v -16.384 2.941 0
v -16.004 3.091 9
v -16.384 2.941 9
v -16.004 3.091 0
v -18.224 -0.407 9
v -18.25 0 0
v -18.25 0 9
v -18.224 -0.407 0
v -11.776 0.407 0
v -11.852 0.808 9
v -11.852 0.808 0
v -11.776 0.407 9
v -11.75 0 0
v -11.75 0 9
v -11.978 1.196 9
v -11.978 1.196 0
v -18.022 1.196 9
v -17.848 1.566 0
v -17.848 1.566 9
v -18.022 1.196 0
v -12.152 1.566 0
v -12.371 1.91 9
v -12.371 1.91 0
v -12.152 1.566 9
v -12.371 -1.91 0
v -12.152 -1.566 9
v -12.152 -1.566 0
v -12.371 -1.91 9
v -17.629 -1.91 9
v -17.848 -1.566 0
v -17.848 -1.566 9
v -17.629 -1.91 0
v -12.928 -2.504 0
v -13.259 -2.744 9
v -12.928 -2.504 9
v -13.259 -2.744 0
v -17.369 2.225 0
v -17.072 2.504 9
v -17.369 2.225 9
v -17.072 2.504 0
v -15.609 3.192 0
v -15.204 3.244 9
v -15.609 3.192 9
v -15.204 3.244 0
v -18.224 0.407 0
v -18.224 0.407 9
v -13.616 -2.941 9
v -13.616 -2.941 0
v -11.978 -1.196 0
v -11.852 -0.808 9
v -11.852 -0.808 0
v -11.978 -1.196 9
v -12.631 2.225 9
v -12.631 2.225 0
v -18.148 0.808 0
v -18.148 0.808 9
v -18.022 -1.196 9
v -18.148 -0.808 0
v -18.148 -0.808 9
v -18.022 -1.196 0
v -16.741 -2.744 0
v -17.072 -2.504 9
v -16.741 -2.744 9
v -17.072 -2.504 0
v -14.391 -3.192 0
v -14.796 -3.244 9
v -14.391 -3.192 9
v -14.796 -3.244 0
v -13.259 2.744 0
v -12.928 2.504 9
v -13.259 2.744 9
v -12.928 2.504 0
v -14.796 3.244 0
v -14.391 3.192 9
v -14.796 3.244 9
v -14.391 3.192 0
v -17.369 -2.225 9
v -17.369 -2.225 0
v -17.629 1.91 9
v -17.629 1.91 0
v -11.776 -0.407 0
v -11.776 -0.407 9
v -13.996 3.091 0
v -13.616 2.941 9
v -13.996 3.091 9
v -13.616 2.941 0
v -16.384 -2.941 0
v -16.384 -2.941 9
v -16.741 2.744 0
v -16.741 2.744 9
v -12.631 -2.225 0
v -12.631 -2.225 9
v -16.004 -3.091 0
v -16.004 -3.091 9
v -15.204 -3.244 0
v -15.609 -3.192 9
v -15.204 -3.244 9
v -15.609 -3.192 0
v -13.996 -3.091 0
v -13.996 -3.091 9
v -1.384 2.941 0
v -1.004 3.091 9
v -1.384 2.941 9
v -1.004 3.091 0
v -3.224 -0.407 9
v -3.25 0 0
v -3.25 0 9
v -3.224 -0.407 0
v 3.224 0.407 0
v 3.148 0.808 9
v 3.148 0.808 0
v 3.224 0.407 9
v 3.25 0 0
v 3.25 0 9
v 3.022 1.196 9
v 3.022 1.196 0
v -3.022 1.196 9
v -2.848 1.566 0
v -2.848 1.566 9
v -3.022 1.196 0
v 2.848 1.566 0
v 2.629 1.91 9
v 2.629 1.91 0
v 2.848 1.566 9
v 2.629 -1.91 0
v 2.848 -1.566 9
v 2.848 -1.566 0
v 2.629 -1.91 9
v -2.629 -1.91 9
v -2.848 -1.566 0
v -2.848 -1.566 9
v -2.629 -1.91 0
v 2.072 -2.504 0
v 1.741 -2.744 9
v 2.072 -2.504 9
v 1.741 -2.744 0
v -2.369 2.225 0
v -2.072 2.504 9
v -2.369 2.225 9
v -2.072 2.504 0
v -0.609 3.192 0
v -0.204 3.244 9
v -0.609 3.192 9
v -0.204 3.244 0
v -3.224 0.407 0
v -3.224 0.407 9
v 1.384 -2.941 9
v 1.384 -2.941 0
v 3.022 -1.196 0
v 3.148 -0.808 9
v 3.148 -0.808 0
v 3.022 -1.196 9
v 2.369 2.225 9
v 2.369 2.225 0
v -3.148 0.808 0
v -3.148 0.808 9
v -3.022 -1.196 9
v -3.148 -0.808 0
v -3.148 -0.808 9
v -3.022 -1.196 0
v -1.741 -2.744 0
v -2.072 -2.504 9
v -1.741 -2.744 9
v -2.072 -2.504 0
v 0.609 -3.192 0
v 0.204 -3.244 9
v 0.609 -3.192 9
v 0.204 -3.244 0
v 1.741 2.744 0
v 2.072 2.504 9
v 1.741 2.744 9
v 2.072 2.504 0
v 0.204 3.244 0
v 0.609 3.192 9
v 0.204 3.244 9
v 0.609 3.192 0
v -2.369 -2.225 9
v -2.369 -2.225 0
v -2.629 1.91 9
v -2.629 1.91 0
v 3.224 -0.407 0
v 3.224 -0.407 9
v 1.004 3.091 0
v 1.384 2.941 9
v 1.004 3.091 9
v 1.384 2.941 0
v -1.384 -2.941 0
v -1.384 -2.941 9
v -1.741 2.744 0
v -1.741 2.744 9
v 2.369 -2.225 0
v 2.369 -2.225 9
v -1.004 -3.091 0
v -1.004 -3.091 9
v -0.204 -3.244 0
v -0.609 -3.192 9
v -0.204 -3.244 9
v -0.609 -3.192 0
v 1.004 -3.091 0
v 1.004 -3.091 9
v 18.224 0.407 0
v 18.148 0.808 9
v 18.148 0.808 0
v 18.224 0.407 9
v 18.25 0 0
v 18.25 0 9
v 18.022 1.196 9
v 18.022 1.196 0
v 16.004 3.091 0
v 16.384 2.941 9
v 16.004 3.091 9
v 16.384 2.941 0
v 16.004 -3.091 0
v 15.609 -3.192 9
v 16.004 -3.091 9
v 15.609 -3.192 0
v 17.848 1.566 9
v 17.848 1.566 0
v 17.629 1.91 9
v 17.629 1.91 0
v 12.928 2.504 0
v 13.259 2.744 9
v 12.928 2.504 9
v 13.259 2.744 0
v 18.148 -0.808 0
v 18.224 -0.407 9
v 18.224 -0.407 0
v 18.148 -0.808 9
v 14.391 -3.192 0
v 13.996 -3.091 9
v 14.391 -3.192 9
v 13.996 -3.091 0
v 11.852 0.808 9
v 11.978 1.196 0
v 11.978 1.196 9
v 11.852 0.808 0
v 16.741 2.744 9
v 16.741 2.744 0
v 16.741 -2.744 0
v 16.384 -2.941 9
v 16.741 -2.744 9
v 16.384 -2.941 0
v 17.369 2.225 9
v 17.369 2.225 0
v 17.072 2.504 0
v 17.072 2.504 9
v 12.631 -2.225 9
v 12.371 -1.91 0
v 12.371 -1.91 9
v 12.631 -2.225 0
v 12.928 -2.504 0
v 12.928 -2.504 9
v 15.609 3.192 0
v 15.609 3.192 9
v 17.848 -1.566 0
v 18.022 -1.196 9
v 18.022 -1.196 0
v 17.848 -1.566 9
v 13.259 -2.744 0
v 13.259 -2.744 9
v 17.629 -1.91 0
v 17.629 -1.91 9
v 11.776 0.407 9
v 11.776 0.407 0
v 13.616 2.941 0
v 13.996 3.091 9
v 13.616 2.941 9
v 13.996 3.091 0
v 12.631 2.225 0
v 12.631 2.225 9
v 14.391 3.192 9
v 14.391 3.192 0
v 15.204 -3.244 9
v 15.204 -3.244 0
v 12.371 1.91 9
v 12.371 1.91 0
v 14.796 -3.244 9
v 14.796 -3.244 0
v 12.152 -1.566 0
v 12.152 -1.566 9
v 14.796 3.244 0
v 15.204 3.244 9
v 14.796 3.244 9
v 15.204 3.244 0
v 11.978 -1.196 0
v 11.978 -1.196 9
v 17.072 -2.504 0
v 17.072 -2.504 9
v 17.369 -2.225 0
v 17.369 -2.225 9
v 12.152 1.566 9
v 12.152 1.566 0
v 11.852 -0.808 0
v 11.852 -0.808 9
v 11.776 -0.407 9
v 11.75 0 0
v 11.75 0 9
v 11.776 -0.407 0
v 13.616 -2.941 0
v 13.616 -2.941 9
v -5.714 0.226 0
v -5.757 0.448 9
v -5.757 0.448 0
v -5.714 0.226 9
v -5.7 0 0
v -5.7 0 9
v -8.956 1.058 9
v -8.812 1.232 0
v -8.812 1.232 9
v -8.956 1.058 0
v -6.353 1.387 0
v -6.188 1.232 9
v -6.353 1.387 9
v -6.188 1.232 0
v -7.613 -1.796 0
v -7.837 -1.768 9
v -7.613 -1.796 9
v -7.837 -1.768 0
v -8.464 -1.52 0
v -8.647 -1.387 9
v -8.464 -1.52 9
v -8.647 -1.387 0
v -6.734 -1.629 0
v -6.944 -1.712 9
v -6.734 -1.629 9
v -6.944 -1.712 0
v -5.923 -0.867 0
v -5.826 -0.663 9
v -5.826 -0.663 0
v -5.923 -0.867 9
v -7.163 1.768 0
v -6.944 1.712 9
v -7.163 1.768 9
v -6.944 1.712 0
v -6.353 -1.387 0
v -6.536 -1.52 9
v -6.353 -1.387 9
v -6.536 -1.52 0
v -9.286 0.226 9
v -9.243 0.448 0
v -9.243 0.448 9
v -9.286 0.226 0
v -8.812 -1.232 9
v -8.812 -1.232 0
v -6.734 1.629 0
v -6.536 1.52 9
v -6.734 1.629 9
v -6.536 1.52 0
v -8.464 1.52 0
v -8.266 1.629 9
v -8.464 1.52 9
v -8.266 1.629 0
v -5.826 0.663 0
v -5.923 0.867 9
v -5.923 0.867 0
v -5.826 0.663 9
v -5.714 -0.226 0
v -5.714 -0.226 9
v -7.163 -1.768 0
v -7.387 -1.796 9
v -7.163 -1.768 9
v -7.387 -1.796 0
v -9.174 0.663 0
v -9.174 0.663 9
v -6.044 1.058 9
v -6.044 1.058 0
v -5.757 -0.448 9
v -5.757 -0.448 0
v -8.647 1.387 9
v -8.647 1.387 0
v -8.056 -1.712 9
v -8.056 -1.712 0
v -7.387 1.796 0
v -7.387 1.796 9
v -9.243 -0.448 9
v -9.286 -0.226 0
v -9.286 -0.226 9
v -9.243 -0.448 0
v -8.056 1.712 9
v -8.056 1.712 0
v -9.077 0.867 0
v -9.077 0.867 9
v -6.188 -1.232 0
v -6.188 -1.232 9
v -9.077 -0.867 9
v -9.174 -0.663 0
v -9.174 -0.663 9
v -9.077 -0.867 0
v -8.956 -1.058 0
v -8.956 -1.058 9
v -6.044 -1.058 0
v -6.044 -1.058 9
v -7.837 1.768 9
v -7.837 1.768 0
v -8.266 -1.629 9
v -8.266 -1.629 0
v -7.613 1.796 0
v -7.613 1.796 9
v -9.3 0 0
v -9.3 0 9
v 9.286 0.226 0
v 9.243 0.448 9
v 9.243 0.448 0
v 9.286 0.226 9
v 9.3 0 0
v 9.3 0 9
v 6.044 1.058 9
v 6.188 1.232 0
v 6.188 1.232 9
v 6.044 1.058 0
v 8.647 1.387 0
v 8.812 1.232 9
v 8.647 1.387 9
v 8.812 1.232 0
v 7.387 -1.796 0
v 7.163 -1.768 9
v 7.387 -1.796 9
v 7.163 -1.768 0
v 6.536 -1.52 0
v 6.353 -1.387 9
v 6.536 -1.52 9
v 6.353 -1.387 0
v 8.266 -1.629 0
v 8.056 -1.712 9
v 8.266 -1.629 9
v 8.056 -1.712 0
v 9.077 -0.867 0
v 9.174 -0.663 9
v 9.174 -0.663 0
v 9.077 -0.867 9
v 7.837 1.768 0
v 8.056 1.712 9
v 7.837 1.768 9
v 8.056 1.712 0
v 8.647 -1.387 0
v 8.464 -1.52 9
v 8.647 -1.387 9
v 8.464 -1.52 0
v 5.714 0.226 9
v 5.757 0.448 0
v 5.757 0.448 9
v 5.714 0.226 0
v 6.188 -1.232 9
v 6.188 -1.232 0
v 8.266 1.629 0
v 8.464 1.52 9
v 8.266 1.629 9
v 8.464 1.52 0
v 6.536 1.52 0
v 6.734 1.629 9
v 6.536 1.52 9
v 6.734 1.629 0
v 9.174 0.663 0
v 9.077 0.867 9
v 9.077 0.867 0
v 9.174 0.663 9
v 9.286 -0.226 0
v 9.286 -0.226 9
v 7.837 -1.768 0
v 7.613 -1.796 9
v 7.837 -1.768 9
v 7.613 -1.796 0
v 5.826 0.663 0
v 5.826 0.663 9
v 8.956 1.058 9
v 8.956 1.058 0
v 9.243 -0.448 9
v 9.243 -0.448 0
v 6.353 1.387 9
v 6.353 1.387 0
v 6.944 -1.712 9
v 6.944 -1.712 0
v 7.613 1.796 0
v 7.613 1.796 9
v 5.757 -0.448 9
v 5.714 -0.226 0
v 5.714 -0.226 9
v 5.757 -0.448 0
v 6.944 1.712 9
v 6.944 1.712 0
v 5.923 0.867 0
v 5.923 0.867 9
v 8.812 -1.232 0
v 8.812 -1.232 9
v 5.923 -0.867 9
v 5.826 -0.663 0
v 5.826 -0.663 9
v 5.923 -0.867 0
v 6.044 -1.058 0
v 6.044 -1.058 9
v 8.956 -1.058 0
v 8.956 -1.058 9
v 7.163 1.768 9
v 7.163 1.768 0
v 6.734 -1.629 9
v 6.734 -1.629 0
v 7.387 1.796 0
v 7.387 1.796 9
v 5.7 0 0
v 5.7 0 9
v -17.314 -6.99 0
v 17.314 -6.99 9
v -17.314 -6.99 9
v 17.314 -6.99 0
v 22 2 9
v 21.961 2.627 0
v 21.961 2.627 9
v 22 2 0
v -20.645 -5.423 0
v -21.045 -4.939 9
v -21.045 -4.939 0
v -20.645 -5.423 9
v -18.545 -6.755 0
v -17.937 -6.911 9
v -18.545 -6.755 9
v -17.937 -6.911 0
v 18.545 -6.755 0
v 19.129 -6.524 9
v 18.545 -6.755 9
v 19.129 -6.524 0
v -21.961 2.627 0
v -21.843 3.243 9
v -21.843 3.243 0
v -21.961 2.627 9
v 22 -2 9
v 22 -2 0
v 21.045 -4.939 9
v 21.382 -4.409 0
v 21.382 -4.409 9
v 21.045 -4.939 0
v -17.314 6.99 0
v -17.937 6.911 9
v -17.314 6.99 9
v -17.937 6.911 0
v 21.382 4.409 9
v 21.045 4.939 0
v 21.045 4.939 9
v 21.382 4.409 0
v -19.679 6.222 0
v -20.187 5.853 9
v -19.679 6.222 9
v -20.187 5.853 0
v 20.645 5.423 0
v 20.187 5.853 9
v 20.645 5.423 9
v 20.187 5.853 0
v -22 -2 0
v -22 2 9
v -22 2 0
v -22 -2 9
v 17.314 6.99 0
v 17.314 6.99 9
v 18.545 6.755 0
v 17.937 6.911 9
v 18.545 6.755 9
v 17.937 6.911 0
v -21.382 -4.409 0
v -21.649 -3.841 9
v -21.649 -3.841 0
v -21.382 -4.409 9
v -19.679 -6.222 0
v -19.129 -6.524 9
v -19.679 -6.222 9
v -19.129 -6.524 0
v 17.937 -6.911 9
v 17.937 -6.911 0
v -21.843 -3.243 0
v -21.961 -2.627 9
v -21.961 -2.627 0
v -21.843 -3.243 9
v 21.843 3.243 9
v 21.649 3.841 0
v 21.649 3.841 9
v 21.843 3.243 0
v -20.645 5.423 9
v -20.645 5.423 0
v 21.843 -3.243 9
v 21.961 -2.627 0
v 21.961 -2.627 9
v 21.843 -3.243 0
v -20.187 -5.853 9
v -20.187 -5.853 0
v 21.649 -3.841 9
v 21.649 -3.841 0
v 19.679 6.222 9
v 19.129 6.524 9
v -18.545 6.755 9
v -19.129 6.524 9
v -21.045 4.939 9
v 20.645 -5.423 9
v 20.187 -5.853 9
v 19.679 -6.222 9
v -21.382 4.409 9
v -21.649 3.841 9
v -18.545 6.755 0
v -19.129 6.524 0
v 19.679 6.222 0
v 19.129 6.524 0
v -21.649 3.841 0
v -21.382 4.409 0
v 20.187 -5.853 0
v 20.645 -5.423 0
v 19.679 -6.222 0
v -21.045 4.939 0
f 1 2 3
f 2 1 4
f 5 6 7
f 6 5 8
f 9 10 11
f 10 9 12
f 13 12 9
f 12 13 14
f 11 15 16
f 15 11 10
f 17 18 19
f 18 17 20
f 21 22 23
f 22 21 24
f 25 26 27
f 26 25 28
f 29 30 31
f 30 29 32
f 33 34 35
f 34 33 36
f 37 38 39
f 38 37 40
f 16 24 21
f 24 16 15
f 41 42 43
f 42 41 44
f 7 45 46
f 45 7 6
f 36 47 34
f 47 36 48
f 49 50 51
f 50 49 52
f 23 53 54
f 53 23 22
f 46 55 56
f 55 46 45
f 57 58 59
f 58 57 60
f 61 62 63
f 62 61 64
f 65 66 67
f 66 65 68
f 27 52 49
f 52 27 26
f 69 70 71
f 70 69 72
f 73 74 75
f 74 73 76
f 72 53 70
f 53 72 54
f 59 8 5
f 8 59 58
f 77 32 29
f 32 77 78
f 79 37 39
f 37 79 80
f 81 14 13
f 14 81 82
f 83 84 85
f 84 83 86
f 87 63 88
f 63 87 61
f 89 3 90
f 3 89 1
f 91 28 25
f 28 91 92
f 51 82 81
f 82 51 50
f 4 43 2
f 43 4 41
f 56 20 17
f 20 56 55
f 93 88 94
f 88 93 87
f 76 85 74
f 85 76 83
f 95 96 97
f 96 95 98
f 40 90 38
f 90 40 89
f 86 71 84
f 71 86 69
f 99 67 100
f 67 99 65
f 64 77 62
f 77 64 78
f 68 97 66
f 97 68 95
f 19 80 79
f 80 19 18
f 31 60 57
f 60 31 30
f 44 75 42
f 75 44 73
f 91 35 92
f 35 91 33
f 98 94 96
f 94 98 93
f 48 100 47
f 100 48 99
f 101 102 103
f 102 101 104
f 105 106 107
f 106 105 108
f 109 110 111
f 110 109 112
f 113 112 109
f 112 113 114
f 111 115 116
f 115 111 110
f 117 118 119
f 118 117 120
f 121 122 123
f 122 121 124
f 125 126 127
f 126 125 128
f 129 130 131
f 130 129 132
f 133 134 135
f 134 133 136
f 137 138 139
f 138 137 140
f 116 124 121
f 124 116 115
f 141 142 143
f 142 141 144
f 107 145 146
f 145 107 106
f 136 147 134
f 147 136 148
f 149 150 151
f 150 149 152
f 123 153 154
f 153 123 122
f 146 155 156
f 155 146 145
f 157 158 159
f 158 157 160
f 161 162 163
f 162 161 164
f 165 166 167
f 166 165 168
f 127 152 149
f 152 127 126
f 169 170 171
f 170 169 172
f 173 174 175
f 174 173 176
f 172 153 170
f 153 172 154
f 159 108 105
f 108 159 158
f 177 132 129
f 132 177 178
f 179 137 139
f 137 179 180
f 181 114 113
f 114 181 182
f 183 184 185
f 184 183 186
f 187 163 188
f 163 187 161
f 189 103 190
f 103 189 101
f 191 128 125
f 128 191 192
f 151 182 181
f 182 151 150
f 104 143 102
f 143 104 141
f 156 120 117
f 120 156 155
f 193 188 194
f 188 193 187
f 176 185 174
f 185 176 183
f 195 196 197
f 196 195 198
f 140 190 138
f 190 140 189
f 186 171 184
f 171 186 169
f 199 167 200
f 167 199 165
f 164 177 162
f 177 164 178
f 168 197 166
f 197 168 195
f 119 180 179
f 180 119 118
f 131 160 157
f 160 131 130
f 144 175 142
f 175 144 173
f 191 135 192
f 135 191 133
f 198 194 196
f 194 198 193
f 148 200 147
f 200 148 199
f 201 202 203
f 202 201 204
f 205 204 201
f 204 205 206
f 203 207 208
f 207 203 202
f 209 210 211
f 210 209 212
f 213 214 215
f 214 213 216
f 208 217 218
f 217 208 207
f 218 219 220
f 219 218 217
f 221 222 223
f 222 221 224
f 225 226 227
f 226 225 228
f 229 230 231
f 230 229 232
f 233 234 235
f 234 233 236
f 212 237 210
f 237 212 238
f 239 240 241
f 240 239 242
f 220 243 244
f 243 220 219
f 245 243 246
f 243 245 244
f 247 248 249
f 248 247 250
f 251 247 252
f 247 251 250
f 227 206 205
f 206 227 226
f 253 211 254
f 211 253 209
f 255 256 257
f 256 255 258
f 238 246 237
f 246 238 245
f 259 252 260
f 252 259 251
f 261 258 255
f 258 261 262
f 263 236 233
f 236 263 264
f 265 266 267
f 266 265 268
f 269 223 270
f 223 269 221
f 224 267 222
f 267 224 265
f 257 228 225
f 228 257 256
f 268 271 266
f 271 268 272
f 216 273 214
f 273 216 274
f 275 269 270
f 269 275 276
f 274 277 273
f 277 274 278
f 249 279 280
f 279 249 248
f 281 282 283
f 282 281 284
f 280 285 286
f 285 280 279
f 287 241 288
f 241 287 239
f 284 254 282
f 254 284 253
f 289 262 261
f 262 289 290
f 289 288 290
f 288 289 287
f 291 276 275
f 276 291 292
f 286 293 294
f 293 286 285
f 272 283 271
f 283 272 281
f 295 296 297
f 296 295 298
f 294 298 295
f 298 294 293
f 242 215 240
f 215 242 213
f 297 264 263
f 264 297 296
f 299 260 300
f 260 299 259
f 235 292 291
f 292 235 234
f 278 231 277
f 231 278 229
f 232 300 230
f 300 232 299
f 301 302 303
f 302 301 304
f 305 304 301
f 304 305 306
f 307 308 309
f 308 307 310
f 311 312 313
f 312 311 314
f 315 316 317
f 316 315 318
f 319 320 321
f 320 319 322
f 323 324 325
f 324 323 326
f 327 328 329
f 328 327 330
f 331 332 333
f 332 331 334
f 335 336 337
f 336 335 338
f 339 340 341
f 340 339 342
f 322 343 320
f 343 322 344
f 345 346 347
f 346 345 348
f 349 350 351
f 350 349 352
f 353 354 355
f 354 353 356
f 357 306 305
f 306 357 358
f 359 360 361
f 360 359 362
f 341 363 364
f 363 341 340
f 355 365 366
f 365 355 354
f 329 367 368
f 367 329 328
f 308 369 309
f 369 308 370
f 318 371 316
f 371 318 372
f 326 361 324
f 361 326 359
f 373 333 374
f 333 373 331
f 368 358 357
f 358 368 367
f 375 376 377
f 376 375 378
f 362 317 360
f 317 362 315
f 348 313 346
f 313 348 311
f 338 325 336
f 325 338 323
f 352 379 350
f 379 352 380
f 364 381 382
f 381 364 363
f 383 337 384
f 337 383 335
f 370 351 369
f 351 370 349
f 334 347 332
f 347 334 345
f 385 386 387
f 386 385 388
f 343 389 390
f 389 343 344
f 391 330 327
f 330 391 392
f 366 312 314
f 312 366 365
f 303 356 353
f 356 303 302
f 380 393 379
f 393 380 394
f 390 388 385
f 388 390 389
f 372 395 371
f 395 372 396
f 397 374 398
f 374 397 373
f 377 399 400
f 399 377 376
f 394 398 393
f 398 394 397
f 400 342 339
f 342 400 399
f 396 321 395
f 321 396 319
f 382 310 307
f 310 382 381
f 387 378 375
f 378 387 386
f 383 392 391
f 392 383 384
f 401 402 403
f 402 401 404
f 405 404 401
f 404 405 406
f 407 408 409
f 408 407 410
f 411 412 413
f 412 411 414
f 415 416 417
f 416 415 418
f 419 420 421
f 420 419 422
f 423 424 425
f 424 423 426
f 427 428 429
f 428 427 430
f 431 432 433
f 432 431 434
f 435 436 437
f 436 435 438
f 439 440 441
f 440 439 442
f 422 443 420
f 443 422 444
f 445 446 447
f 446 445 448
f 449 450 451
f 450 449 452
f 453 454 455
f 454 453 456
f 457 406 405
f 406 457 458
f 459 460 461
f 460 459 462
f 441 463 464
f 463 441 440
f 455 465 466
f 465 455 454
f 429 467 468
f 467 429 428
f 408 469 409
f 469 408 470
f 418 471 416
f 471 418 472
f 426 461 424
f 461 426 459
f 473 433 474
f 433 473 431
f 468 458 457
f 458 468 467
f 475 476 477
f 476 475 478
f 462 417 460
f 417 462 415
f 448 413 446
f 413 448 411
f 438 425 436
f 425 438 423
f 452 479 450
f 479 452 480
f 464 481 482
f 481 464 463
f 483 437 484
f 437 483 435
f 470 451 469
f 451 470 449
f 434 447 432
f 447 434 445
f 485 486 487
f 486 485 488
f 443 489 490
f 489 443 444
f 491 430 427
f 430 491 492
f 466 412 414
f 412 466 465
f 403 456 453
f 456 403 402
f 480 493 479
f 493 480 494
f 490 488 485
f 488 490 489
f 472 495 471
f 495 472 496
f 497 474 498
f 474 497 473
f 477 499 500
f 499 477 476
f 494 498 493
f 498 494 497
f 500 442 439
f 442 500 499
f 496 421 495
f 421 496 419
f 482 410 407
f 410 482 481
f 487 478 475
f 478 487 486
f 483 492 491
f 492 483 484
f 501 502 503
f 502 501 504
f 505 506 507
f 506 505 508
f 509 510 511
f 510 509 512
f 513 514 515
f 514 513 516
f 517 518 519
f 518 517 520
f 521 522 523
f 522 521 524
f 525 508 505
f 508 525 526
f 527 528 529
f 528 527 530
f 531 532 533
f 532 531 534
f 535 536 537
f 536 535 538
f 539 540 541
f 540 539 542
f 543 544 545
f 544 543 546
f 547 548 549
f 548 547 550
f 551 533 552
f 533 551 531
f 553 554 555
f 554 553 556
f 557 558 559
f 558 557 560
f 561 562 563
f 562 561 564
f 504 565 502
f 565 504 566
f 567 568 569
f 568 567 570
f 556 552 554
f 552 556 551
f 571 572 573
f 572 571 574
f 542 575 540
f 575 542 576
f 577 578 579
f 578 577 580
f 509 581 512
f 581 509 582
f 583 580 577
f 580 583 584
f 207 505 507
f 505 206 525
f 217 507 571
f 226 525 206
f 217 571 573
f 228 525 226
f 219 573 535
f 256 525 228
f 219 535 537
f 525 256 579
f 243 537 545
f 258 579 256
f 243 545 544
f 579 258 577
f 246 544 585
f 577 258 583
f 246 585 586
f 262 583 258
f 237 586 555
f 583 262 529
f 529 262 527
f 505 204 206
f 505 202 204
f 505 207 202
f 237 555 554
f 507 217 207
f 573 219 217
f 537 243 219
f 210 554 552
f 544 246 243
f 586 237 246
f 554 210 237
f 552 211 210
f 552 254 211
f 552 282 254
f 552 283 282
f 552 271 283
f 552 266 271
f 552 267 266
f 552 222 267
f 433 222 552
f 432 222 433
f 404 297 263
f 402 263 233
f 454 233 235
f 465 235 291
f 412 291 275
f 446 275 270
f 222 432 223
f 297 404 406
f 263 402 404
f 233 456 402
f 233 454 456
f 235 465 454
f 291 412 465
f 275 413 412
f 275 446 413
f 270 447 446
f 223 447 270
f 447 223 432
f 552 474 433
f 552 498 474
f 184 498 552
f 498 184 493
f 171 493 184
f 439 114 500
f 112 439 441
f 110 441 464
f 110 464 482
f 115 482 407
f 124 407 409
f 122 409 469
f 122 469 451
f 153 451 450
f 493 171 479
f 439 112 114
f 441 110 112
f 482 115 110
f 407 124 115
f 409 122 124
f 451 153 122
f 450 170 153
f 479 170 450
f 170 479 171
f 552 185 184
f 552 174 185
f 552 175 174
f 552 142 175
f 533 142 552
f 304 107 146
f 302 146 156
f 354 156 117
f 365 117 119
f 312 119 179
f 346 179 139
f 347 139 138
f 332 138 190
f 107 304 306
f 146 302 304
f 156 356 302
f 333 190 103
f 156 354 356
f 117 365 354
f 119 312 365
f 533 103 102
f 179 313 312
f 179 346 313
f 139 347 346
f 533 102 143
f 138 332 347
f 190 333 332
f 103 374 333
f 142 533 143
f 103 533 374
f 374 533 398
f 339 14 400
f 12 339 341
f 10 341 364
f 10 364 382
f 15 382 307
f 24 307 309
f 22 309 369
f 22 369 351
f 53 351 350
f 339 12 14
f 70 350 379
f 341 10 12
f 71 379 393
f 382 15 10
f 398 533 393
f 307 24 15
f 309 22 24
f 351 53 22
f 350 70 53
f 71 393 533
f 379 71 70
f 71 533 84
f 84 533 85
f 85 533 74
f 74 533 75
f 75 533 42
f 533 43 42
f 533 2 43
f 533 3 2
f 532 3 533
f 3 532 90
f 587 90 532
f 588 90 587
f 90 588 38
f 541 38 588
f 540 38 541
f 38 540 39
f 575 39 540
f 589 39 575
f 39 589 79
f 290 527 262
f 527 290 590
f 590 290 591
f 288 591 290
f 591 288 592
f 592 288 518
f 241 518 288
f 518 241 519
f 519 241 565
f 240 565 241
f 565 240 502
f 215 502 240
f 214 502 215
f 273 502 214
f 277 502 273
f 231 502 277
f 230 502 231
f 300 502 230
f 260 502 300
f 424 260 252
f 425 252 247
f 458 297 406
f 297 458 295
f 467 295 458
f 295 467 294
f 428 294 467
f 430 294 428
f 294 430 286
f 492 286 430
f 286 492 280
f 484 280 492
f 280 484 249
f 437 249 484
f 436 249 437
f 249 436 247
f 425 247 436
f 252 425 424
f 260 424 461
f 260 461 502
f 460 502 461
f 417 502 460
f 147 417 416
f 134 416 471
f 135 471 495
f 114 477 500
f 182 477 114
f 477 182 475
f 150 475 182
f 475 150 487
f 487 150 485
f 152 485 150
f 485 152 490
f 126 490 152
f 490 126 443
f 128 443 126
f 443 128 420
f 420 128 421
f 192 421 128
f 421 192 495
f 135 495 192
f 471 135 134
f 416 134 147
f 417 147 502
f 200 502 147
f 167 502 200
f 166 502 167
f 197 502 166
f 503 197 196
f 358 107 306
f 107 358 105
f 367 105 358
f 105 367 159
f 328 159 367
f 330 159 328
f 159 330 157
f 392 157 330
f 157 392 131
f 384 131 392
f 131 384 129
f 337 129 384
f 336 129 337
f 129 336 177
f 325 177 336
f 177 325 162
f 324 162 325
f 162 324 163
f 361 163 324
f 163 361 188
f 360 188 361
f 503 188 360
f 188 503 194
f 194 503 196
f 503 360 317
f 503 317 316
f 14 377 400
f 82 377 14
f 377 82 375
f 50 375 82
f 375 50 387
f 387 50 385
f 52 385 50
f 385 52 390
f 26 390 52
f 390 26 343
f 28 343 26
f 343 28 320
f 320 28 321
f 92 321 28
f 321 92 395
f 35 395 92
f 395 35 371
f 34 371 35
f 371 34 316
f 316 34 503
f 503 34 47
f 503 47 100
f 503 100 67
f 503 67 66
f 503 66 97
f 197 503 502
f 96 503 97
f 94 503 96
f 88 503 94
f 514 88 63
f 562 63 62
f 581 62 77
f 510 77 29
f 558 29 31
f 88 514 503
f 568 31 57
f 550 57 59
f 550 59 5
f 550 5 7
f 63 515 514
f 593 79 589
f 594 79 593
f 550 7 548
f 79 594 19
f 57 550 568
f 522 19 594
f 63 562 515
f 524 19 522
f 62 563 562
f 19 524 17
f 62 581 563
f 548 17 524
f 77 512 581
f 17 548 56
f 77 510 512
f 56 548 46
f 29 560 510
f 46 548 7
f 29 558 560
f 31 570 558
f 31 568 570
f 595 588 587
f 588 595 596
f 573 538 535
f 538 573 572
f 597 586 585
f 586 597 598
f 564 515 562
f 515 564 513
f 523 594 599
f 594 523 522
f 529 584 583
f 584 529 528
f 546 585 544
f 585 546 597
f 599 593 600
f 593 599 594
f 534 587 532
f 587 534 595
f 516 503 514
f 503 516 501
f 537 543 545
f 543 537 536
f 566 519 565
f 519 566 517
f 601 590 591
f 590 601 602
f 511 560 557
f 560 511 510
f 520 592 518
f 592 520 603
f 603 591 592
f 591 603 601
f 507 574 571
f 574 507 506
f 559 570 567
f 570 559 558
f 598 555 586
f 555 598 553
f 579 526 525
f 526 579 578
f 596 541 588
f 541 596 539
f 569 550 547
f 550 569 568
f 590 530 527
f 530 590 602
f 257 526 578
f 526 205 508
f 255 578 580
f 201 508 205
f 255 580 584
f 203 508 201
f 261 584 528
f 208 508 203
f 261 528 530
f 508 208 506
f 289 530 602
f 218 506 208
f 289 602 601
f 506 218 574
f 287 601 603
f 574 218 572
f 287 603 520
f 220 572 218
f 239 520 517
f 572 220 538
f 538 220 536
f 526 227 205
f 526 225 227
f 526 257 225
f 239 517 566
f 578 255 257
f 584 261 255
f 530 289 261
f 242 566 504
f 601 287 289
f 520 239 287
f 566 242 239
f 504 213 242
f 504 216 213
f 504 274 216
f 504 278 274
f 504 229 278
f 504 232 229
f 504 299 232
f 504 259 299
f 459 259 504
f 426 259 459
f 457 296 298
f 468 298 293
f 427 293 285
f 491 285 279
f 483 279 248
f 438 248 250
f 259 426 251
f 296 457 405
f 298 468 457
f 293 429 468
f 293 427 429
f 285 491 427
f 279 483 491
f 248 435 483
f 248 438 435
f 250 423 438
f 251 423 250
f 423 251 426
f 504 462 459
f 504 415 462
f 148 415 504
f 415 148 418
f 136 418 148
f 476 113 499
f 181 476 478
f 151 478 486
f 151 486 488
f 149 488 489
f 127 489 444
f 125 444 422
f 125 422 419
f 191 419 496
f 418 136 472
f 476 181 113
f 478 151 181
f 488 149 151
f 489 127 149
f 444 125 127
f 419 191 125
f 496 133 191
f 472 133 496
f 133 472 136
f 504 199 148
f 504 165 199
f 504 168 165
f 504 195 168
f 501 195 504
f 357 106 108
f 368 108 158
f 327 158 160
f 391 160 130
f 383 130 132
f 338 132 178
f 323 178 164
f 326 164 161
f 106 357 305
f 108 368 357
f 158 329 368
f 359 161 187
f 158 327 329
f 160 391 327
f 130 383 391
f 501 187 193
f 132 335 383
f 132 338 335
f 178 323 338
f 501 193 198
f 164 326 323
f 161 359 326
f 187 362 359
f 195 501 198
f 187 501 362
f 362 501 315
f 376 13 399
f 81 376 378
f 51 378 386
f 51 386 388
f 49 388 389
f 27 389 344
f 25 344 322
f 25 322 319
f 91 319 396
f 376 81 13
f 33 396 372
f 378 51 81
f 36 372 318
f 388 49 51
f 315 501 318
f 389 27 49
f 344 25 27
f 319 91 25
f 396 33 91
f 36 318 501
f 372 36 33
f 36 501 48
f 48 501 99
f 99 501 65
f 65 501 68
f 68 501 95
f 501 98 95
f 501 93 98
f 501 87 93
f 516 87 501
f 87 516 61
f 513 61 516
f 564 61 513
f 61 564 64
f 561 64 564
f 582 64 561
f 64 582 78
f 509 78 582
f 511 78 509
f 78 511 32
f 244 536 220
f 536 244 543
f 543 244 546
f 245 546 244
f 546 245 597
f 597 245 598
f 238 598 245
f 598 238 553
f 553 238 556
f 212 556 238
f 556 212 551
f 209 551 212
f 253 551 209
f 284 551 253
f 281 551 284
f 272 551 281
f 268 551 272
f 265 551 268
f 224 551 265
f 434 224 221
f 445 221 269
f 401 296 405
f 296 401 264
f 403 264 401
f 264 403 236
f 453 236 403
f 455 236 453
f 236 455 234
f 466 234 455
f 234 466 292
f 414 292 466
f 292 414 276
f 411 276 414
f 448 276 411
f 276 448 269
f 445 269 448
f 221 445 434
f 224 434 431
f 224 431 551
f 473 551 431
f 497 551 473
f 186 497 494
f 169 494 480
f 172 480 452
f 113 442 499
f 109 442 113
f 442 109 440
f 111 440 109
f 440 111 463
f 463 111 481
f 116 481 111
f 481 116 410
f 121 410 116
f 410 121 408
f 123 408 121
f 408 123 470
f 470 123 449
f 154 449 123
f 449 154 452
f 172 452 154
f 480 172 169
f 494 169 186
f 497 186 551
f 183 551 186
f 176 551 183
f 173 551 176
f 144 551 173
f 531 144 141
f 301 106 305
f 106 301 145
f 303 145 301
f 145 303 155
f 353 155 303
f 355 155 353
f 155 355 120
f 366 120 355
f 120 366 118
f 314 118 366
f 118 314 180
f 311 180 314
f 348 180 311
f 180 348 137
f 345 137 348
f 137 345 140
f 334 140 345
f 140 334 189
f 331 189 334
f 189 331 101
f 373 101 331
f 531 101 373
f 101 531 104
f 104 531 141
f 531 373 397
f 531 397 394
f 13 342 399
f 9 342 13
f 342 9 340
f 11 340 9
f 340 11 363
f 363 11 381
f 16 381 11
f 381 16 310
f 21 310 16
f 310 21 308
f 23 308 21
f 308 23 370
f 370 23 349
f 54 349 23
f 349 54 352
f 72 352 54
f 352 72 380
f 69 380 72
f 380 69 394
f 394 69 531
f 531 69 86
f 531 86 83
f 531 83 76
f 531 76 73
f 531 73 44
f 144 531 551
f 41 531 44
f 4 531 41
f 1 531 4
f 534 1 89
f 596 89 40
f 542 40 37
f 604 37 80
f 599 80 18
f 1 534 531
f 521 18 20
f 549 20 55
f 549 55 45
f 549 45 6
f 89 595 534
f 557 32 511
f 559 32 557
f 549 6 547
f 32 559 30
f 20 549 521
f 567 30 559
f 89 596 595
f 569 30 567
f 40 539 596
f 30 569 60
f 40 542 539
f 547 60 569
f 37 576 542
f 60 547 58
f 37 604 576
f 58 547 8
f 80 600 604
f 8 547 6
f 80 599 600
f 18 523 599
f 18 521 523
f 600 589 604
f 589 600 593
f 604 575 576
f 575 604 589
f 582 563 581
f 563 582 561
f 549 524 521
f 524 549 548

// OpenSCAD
$fn = 50;


difference() {
	union() {
		*color(alpha = 1.0000000000, c = "gray") {
			translate(v = [0, 7, 0]) {
				linear_extrude(height = 1) {
					text(font = "Arial:style=Bold", halign = "center", size = 4.5000000000, text = "COMMENT plate main", valign = "center");
				}
			}
		}
		*color(alpha = 1.0000000000, c = "gray") {
			translate(v = [0, 14, 0]) {
				linear_extrude(height = 1) {
					text(font = "Arial:style=Bold", halign = "center", size = 4.5000000000, text = "COMMENT description oobb_plate_shape_p_type_9_depth_3_width_1_height_9_thickness_true_both_holes", valign = "center");
				}
			}
		}
		hull() {
			translate(v = [-17.0000000000, 2.0000000000, 0]) {
				cylinder(h = 9, r = 5);
			}
			translate(v = [17.0000000000, 2.0000000000, 0]) {
				cylinder(h = 9, r = 5);
			}
			translate(v = [-17.0000000000, -2.0000000000, 0]) {
				cylinder(h = 9, r = 5);
			}
			translate(v = [17.0000000000, -2.0000000000, 0]) {
				cylinder(h = 9, r = 5);
			}
		}
	}
	union() {
		*color(alpha = 1.0000000000, c = "gray") {
			translate(v = [0, 7, 0]) {
				linear_extrude(height = 1) {
					text(font = "Arial:style=Bold", halign = "center", size = 4.5000000000, text = "COMMENT holes main", valign = "center");
				}
			}
		}
		*color(alpha = 1.0000000000, c = "gray") {
			translate(v = [0, 14, 0]) {
				linear_extrude(height = 1) {
					text(font = "Arial:style=Bold", halign = "center", size = 4.5000000000, text = "COMMENT description oobb_holes_shape_n_type_3_width_1_height_9_thickness_true_both_holes", valign = "center");
				}
			}
		}
		translate(v = [-15.0000000000, 0.0000000000, 0]) {
			translate(v = [0, 0, -50]) {
				cylinder(h = 100, r = 3.2500000000);
			}
		}
		translate(v = [0, 0, -50]) {
			cylinder(h = 100, r = 3.2500000000);
		}
		translate(v = [15.0000000000, 0.0000000000, 0]) {
			translate(v = [0, 0, -50]) {
				cylinder(h = 100, r = 3.2500000000);
			}
		}
		translate(v = [-15.0000000000, 0.0000000000, 0]) {
			translate(v = [0, 0, -50]) {
				cylinder(h = 100, r = 1.8000000000);
			}
		}
		translate(v = [-7.5000000000, 0.0000000000, 0]) {
			translate(v = [0, 0, -50]) {
				cylinder(h = 100, r = 1.8000000000);
			}
		}
		translate(v = [0, 0, -50]) {
			cylinder(h = 100, r = 1.8000000000);
		}
		translate(v = [7.5000000000, 0.0000000000, 0]) {
			translate(v = [0, 0, -50]) {
				cylinder(h = 100, r = 1.8000000000);
			}
		}
		translate(v = [15.0000000000, 0.0000000000, 0]) {
			translate(v = [0, 0, -50]) {
				cylinder(h = 100, r = 1.8000000000);
			}
		}
	}
}
